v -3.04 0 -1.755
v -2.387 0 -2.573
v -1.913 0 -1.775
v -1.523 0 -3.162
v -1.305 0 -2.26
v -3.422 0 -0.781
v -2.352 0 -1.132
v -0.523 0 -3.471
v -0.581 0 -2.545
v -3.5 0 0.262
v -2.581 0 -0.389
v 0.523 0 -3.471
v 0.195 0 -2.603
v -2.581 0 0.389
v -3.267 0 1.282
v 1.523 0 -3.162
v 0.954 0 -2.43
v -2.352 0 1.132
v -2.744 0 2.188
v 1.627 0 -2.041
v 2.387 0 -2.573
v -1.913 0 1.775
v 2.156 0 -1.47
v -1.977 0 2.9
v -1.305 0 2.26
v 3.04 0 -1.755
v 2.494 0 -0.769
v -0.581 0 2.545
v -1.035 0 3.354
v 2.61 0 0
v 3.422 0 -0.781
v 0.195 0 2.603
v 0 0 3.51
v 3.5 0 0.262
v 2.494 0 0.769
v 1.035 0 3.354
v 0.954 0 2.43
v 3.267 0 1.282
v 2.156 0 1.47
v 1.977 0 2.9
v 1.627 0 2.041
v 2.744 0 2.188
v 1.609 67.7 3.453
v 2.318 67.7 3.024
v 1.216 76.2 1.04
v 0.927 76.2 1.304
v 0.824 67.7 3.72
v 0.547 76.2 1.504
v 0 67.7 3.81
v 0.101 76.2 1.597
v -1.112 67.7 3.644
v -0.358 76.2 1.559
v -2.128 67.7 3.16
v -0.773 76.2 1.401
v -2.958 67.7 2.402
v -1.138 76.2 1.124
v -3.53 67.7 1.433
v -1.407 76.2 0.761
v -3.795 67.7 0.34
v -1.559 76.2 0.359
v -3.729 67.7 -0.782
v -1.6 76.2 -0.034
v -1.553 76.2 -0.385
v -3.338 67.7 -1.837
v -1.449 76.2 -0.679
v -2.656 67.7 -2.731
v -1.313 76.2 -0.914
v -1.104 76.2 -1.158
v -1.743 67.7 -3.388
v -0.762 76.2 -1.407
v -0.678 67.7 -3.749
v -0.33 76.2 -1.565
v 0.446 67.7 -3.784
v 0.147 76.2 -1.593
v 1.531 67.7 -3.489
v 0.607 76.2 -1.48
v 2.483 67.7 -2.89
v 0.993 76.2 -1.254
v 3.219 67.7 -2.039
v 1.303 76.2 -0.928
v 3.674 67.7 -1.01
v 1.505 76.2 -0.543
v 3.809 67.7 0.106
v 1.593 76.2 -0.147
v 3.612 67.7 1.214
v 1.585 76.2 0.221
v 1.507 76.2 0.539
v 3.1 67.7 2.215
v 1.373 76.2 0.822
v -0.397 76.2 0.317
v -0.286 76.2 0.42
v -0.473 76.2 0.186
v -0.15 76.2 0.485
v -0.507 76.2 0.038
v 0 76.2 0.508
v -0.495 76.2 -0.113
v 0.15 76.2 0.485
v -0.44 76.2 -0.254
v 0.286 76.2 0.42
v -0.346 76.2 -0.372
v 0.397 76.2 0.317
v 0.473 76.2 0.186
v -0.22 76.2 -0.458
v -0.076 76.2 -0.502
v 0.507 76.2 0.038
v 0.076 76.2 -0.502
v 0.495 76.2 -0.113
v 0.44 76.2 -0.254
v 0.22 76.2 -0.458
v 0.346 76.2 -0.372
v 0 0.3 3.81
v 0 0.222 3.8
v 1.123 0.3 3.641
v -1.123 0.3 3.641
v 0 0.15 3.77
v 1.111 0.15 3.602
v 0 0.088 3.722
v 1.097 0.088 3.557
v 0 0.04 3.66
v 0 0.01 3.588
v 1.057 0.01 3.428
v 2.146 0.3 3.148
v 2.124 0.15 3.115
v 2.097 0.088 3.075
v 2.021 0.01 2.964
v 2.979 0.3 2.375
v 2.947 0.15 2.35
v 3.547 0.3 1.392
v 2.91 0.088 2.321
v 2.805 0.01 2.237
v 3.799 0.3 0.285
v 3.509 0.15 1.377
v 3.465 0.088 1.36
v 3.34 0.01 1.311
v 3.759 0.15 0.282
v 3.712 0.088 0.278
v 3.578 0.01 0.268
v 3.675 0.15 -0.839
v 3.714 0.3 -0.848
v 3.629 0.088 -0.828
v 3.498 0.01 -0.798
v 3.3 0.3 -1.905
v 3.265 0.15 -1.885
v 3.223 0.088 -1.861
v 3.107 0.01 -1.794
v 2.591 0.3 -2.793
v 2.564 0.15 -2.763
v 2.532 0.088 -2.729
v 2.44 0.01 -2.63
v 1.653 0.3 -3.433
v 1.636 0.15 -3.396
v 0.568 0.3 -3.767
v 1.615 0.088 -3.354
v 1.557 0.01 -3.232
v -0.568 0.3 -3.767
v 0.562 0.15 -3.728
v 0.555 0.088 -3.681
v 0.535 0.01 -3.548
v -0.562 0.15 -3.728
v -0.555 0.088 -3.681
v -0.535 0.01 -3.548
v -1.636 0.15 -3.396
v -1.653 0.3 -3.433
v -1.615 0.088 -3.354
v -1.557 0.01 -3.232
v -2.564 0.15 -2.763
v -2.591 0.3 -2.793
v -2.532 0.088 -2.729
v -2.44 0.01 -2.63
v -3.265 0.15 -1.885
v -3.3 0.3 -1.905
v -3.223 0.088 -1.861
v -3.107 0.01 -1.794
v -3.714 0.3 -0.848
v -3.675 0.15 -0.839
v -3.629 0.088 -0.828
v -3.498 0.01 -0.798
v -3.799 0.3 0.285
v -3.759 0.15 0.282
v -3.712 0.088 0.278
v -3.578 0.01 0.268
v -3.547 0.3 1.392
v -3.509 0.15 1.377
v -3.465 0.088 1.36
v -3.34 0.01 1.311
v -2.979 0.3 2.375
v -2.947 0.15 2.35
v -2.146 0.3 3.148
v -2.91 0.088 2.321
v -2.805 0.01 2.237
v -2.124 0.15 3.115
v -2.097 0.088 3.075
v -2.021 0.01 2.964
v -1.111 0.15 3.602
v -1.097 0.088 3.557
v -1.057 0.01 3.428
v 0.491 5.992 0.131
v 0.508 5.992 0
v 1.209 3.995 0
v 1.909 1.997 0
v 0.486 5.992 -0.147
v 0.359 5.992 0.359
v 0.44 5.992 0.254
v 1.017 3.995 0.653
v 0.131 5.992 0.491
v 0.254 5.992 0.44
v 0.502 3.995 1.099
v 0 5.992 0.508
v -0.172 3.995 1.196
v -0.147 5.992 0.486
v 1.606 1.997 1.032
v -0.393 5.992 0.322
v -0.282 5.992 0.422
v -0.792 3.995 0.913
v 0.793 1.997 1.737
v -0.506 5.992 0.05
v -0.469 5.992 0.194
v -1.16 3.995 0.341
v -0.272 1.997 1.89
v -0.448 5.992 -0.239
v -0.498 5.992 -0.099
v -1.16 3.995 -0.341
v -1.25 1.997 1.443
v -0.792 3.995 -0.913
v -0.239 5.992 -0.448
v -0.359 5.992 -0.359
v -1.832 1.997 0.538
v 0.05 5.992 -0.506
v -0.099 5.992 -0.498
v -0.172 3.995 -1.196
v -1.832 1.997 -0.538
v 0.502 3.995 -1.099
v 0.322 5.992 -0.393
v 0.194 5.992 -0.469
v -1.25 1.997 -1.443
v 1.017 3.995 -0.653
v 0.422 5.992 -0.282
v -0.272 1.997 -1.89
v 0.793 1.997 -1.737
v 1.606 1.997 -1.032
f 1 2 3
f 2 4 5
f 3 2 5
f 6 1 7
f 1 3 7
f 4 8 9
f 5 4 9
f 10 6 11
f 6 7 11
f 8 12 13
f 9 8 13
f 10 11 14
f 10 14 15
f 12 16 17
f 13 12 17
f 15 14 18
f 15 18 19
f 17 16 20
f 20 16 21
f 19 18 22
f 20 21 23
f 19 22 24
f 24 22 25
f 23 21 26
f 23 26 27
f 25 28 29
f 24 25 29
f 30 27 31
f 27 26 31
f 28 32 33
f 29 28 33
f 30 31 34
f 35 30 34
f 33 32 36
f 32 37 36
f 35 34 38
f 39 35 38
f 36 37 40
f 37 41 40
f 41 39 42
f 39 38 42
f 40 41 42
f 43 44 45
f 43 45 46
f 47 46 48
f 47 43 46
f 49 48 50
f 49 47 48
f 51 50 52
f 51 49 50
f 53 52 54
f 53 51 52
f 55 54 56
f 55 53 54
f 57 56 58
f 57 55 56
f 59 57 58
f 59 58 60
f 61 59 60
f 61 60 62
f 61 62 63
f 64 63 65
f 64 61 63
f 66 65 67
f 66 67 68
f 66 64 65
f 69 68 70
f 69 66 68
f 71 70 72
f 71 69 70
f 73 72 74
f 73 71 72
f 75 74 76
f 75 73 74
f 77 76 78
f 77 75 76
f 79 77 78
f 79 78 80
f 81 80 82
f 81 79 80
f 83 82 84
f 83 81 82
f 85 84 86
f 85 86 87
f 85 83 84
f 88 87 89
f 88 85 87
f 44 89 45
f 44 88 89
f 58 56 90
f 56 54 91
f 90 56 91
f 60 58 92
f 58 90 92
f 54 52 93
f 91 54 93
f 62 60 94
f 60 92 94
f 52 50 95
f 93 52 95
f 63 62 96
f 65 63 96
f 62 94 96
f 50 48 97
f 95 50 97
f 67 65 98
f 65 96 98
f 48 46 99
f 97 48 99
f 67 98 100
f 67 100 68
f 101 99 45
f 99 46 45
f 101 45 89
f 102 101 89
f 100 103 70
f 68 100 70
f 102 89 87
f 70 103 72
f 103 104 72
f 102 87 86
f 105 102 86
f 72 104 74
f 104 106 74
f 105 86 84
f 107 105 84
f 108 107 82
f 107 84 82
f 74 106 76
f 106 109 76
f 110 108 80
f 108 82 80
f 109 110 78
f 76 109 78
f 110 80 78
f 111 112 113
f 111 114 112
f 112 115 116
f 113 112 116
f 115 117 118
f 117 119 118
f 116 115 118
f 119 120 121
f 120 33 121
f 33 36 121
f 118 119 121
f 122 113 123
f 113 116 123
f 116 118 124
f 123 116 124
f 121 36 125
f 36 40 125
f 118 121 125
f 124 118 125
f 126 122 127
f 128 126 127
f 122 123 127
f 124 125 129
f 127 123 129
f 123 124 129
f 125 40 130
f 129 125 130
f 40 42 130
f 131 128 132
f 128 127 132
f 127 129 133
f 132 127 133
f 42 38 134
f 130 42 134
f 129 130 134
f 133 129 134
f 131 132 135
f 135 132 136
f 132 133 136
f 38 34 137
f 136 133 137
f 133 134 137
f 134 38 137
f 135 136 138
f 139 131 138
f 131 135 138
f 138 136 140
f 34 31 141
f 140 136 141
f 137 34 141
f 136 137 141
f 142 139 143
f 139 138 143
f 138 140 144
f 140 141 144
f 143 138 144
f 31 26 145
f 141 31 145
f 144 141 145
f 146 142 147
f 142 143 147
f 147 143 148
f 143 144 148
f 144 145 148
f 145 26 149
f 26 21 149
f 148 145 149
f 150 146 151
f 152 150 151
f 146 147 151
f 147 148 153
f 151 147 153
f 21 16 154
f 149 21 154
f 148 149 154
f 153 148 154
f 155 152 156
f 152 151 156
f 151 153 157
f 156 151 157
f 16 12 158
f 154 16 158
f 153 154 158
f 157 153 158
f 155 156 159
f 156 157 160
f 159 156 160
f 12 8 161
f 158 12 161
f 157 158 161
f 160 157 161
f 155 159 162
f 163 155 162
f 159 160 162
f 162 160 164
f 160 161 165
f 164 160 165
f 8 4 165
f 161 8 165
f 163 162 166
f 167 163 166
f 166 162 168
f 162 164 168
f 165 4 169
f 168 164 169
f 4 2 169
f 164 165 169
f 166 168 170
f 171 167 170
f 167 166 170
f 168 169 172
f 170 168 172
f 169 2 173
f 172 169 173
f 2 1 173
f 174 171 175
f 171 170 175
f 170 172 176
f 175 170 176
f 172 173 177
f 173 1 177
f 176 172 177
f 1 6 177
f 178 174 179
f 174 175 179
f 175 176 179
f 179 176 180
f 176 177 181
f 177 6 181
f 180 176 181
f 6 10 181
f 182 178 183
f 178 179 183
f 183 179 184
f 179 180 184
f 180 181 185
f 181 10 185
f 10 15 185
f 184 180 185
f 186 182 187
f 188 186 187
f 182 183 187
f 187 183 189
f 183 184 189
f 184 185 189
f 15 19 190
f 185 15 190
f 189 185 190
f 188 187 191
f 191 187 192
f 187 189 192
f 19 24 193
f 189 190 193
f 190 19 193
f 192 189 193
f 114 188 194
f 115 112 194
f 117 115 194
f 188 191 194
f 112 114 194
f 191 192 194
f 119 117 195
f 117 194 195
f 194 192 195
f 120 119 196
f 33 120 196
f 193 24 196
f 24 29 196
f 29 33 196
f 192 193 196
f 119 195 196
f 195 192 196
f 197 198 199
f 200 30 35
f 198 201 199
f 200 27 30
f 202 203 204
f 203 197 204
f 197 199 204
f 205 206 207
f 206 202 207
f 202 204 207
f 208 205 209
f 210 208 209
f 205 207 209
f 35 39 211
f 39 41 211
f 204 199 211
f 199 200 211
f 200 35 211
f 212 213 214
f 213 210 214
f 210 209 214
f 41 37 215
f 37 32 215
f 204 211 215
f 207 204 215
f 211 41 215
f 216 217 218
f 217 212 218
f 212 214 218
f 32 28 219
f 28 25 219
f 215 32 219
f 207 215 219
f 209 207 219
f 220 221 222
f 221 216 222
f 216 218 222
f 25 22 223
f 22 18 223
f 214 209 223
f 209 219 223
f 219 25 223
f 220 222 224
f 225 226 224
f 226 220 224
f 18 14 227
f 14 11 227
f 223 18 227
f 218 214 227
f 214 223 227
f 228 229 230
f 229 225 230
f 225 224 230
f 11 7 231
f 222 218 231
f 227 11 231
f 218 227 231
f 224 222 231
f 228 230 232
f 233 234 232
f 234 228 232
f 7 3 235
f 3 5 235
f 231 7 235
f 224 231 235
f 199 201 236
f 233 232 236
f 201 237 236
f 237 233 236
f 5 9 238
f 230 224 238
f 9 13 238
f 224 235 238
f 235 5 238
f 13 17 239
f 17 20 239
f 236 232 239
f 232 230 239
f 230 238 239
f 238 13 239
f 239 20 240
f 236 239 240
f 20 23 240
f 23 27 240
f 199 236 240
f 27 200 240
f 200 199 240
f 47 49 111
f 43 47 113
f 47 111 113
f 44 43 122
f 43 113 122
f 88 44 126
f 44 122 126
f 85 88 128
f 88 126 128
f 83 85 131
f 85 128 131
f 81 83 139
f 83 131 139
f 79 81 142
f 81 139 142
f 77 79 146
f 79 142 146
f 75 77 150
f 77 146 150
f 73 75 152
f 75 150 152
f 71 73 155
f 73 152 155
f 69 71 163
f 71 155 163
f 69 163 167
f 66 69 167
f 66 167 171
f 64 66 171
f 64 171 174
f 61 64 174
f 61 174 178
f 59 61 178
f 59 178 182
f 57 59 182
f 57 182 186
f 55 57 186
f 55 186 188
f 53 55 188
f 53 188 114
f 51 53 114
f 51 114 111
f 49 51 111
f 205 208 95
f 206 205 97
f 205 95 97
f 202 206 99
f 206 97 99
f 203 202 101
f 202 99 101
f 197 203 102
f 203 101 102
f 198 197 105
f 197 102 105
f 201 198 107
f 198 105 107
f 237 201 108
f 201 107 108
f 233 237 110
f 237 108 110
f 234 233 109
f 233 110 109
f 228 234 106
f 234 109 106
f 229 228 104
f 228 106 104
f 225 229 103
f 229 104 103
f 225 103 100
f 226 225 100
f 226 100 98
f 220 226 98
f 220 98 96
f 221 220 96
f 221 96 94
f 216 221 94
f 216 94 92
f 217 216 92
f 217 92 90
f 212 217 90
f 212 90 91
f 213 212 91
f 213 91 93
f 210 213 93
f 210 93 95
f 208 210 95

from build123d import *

# Parameters (mm, degrees)
SKETCH1_R           = 3.81
BOSS_EXTRUDE1_DEPTH = 67.7
SKETCH5_R           = 0.508
CUT_EXTRUDE2_DEPTH  = 77.390262478
SKETCH7_R           = 2.61
CUT_EXTRUDE3_DEPTH  = 6
CUT_EXTRUDE3_DRAFT  = -19.33
FILLET3_R           = 0.3


with BuildPart() as part:
    # Sketch1 → Boss-Extrude1 (new body)
    with BuildSketch(Plane(origin=(0, 0, 0), x_dir=(1, 0, 0), z_dir=(0, 1, 0))):
        with Locations(Location((0, 0, 0), (0, 0, 270))):
            Circle(SKETCH1_R)
    extrude(amount=BOSS_EXTRUDE1_DEPTH)

    # Loft1: read off the stored shape, not the designer's step
    # Loft1: loft between two sections, ruled curve by curve
    loft1_from = [
        Edge.make_bspline([(1.215970554, 76.2, 1.039911348), (-0.863852142, 76.2, 3.471852456), (-3.29579325, 76.2, 1.39202976), (-1.215970554, 76.2, -1.039911348), (0.863852142, 76.2, -3.471852456), (3.29579325, 76.2, -1.39202976), (1.215970554, 76.2, 1.039911348)], [0, 0, 0, 0, 0.5, 0.5, 0.5, 1, 1, 1, 1], 3, [1, 0.333333333, 0.333333333, 1, 0.333333333, 0.333333333, 1]),
    ]
    loft1_to = [
        Edge.make_bspline([(2.318114705, 67.7, 3.023647501), (-3.729180297, 67.7, 7.659876912), (-8.365409708, 67.7, 1.612581909), (-2.318114705, 67.7, -3.023647501), (3.729180297, 67.7, -7.659876912), (8.365409708, 67.7, -1.612581909), (2.318114705, 67.7, 3.023647501)], [0, 0, 0, 0, 0.5, 0.5, 0.5, 1, 1, 1, 1], 3, [1, 0.333333333, 0.333333333, 1, 0.333333333, 0.333333333, 1]),
    ]
    loft1 = Solid(Shell([*[Face.make_surface_from_curves(loft1_from[k], loft1_to[k]) for k in range(1)], Face(Wire(loft1_from)), Face(Wire(loft1_to))]))
    add(loft1)

    # Sketch5 → Cut-Extrude2 (cut, through all)
    with BuildSketch(Plane(origin=(0, 76.2, 0), x_dir=(1, 0, 0), z_dir=(0, 1, 0))):
        with Locations(Location((0, 0, 0), (0, 0, 270))):
            Circle(SKETCH5_R)
    extrude(amount=-CUT_EXTRUDE2_DEPTH, mode=Mode.SUBTRACT)


with BuildPart() as cut_extrude3_tool:
    # Sketch7 → Cut-Extrude3 (with draft: the straight prism first)
    with BuildSketch(Plane.XZ):
        Circle(SKETCH7_R)
    extrude(amount=-CUT_EXTRUDE3_DEPTH)
    # Cut-Extrude3: the draft: its side faces are tilted about the plane it starts from
    cut_extrude3_sides = [cut_extrude3_tool.faces().sort_by_distance(p)[0] for p in [
        (-2.61, 3, 0),
    ]]
    draft(cut_extrude3_sides, Plane.XZ, CUT_EXTRUDE3_DRAFT)


with BuildPart() as part_1:
    add(part.part)

    # Cut-Extrude3: cut by cut_extrude3_tool
    add(cut_extrude3_tool.part, mode=Mode.SUBTRACT)

    # Fillet3
    fillet3_edges = [part_1.edges().sort_by_distance(p)[0] for p in [
        (0, 0, -3.81),
    ]]
    fillet(fillet3_edges, radius=FILLET3_R)


solid = part_1.part
